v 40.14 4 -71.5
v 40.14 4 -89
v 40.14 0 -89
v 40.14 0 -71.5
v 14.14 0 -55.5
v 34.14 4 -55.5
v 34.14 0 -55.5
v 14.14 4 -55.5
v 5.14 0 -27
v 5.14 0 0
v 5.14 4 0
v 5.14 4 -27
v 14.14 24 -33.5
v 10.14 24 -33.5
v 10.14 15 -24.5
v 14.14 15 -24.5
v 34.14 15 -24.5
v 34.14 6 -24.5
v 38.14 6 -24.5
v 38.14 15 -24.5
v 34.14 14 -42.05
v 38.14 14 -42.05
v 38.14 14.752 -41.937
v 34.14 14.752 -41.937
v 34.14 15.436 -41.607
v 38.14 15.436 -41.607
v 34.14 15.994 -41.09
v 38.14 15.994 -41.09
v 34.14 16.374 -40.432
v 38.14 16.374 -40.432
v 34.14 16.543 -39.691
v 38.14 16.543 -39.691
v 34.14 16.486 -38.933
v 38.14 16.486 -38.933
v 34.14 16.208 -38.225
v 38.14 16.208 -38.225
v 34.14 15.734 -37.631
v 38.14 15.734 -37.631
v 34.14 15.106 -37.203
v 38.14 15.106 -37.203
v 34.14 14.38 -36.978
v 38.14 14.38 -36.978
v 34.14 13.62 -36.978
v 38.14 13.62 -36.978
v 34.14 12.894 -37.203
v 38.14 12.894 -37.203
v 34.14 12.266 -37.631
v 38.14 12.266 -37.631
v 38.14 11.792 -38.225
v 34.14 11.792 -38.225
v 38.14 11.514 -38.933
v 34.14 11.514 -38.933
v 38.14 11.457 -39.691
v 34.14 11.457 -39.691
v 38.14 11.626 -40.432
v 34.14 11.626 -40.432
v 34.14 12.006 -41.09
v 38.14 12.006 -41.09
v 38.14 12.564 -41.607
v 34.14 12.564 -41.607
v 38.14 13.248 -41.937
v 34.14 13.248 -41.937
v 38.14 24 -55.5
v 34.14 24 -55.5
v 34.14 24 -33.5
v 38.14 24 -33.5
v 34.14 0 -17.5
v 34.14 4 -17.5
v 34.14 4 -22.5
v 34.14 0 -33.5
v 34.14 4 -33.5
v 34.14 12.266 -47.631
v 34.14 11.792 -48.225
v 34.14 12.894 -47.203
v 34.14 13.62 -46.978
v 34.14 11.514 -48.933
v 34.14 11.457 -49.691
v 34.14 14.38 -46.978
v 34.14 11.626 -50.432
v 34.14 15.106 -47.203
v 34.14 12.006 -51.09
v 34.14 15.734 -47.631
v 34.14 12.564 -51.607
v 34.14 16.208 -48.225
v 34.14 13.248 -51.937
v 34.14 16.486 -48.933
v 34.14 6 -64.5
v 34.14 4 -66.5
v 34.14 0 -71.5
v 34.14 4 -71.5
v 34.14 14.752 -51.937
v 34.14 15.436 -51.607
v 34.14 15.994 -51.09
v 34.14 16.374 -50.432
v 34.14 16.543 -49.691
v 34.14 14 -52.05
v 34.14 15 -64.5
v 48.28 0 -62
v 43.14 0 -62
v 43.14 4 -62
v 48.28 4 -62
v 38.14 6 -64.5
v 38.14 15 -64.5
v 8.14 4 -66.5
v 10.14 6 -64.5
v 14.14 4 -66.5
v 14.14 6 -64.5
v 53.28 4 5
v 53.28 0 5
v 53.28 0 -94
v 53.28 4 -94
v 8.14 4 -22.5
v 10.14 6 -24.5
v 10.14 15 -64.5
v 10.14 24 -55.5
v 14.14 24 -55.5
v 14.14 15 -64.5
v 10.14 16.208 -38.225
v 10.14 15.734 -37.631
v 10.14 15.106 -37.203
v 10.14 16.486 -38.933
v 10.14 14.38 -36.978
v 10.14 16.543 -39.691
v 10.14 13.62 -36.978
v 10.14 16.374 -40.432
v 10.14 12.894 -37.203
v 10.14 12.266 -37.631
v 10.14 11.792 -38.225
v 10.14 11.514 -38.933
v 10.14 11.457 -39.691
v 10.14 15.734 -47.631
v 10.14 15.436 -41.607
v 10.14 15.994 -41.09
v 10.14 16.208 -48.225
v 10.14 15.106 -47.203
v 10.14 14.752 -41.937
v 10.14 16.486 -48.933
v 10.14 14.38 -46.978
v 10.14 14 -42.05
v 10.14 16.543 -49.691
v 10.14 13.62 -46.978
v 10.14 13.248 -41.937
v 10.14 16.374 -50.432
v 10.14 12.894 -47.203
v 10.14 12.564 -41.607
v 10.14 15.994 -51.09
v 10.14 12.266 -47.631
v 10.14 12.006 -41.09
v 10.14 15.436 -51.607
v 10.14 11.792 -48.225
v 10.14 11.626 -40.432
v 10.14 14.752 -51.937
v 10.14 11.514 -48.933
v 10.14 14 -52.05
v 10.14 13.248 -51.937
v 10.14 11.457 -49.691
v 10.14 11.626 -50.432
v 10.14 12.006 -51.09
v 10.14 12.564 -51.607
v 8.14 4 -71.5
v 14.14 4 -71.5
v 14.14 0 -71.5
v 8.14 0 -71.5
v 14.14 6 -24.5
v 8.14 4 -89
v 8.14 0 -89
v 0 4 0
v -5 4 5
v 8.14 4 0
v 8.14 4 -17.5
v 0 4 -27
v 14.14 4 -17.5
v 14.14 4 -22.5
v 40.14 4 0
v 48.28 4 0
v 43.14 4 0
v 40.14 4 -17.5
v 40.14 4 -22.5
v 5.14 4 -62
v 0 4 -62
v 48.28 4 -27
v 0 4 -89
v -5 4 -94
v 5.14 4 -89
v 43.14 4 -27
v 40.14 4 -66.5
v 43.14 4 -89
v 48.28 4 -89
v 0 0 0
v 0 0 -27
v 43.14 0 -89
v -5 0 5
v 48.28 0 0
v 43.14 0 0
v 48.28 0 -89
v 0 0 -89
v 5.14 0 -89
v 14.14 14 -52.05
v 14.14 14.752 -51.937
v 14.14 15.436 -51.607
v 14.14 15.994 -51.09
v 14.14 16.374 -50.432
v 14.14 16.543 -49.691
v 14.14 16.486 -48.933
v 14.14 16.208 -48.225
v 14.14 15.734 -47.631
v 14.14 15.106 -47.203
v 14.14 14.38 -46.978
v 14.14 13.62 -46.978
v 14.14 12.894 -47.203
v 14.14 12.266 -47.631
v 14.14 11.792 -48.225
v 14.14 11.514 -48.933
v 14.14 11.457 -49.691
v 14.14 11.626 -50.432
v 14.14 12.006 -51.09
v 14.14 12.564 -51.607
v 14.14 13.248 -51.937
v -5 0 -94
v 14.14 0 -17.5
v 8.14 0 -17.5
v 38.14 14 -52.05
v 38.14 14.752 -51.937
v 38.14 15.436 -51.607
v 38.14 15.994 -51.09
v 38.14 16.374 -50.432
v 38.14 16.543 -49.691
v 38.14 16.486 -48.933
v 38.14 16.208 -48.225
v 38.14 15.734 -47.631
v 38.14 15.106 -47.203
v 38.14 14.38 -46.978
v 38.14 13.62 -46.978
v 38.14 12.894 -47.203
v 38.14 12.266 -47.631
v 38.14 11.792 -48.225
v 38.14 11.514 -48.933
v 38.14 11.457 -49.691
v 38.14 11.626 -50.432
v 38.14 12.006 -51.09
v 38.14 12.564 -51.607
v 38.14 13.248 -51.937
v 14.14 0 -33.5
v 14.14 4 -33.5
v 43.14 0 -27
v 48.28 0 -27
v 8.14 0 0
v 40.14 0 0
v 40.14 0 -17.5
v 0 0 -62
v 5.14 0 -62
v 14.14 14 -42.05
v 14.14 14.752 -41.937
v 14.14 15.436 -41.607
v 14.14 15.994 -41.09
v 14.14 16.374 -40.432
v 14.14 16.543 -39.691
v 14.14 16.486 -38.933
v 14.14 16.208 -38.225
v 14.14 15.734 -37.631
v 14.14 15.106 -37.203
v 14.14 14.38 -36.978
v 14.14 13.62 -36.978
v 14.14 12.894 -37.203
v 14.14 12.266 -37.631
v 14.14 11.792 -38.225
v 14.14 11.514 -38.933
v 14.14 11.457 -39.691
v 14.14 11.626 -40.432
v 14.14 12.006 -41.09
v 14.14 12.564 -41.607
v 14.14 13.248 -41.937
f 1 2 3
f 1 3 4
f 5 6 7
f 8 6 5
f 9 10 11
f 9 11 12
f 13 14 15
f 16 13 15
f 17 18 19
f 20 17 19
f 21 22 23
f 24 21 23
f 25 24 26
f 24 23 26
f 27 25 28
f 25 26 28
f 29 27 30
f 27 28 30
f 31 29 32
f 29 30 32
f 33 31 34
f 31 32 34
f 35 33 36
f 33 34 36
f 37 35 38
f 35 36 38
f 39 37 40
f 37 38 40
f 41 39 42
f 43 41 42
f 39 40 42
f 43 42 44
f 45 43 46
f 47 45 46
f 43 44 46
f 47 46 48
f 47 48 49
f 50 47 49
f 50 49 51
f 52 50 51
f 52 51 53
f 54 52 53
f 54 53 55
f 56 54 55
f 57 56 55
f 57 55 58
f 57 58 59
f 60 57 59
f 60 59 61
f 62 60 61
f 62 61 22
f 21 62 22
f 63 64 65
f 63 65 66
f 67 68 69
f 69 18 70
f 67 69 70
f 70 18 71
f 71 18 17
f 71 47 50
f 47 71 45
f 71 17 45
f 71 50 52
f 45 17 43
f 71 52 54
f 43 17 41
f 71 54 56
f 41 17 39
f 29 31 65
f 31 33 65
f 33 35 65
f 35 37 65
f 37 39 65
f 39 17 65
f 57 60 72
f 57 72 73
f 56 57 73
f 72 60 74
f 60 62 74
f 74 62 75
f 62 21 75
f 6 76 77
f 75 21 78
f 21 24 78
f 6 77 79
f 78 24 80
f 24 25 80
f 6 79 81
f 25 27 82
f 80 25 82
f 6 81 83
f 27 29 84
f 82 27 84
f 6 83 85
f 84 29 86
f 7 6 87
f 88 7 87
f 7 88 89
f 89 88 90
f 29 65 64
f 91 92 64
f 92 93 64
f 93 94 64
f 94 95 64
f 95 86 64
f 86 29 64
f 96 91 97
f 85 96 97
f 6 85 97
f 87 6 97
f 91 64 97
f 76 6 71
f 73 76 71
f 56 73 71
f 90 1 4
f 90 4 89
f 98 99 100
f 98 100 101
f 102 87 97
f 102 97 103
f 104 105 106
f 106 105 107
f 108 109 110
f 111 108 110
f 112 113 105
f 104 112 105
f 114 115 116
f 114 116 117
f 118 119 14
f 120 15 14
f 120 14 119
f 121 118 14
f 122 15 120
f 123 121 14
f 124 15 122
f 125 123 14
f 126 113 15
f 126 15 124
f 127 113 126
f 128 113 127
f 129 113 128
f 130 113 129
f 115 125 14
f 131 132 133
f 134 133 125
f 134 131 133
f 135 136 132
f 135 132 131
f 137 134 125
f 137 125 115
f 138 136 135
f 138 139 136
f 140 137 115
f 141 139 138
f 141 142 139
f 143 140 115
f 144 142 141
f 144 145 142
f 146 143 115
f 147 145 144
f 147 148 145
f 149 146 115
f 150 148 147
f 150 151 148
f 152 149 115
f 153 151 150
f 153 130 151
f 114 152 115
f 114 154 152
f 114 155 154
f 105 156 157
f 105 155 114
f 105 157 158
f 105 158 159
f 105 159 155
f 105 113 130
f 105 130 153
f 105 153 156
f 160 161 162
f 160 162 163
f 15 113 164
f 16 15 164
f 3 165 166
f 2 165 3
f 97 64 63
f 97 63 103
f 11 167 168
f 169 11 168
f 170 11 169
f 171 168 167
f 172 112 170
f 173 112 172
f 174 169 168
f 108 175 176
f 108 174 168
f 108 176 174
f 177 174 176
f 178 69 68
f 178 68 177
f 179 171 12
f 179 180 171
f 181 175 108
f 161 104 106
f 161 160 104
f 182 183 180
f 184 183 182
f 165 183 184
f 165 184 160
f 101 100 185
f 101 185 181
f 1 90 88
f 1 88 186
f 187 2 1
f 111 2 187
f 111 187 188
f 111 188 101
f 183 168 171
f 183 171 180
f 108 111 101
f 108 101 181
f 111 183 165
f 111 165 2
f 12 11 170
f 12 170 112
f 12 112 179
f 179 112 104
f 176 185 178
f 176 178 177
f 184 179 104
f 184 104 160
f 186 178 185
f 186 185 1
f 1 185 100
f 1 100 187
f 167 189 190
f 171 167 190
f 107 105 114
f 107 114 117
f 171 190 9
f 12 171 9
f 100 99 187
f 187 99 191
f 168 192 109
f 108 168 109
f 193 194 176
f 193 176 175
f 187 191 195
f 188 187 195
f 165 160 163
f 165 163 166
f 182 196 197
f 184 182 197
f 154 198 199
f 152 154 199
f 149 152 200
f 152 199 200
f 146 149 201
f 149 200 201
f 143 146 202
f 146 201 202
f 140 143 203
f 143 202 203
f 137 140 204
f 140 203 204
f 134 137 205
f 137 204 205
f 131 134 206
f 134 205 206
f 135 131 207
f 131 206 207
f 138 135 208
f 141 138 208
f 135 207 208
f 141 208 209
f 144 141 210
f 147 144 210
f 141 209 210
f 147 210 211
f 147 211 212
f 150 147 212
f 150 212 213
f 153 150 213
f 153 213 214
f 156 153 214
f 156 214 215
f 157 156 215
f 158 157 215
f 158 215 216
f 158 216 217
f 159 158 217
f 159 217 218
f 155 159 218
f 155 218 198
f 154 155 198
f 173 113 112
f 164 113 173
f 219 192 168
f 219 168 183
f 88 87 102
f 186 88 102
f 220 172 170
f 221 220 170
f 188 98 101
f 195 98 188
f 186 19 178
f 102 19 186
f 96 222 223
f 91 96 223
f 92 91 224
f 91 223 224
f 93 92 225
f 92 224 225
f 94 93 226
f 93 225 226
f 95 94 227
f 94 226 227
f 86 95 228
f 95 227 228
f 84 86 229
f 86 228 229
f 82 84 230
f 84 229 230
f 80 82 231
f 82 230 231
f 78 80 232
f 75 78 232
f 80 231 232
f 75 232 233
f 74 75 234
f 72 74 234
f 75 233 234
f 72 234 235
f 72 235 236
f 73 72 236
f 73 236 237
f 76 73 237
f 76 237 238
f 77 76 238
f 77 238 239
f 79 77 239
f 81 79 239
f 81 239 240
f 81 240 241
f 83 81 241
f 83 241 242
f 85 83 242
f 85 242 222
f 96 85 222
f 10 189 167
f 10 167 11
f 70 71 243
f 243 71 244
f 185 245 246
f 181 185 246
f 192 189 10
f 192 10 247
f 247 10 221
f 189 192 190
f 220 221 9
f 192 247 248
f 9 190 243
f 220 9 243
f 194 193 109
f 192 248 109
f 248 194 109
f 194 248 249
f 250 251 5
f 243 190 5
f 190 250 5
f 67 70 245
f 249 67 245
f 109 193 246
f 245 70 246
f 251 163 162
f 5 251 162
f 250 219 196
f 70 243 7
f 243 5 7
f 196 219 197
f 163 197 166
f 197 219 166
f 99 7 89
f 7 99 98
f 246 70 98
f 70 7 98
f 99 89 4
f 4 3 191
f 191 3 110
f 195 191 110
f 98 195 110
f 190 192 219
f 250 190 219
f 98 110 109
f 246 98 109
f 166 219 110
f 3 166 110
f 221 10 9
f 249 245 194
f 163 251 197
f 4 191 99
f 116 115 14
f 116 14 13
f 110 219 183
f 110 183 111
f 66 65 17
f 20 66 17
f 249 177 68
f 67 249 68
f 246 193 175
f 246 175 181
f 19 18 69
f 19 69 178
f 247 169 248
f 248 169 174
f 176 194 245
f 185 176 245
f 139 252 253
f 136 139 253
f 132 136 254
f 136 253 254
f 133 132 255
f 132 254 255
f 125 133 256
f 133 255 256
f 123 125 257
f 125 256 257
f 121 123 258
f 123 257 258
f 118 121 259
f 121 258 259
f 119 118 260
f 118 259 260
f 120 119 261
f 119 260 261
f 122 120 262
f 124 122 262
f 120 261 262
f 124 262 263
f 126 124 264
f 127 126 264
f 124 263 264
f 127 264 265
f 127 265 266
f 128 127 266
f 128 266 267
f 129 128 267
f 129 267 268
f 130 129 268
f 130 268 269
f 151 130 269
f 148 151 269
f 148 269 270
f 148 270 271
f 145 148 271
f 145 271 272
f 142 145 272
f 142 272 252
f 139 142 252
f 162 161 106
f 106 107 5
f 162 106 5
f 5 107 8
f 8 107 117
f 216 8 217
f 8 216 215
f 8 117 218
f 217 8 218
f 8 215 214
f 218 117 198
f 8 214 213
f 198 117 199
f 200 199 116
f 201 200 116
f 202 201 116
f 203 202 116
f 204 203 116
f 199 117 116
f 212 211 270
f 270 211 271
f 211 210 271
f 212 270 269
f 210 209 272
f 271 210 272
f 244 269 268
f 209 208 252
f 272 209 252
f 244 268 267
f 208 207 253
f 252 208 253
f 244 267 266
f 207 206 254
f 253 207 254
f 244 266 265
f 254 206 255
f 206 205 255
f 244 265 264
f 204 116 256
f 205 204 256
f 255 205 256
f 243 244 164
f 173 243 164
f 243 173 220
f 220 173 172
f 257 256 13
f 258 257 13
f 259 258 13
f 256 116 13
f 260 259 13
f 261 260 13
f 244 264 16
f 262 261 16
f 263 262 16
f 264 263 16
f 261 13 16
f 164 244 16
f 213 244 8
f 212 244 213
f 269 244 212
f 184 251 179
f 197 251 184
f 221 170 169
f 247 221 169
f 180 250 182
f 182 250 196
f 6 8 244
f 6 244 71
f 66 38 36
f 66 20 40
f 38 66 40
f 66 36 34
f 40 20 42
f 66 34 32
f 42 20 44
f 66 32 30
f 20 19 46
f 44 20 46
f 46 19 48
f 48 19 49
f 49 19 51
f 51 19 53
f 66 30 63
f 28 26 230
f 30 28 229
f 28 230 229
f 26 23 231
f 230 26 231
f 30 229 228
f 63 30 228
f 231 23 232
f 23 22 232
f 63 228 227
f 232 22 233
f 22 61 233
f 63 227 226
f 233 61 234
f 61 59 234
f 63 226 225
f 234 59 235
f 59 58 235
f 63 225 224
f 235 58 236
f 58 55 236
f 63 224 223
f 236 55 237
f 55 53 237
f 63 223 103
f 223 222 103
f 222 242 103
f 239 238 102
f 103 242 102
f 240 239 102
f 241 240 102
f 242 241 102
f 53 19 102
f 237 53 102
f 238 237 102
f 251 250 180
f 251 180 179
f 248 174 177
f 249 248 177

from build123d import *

# Parameters (mm, degrees)
SKETCH1_W           = 58.28
SKETCH1_H           = 99
SKETCH1_W_2         = 5.14
SKETCH1_H_2         = 27
BOSS_EXTRUDE1_DEPTH = 4
SKETCH2_W           = 4
SKETCH2_H           = 40
BOSS_EXTRUDE2_DEPTH = 20
CUT_EXTRUDE1_REACH  = 108.175
SKETCH3_R           = 2.55
CHAMFER1_SIZE       = 2
CUT_EXTRUDE2_REACH  = 108.175
CUT_EXTRUDE3_DEPTH  = 4


with BuildPart() as part:
    # Sketch1 → Boss-Extrude1 (new body)
    with BuildSketch(Plane(origin=(0, 0, 0), x_dir=(1, 0, 0), z_dir=(0, 1, 0))):
        with Locations((24.14, 44.5)):
            Rectangle(SKETCH1_W, SKETCH1_H)
        with Locations((2.57, 75.5)):
            Rectangle(SKETCH1_W_2, SKETCH1_H_2, mode=Mode.SUBTRACT)
        with Locations((45.71, 75.5)):
            Rectangle(SKETCH1_W_2, SKETCH1_H_2, mode=Mode.SUBTRACT)
        with Locations((2.57, 13.5)):
            Rectangle(SKETCH1_W_2, SKETCH1_H_2, mode=Mode.SUBTRACT)
        with Locations((45.71, 13.5)):
            Rectangle(SKETCH1_W_2, SKETCH1_H_2, mode=Mode.SUBTRACT)
    extrude(amount=BOSS_EXTRUDE1_DEPTH)

    # Sketch2 → Boss-Extrude2 (add)
    with BuildSketch(Plane(origin=(0, 4, 0), x_dir=(1, 0, 0), z_dir=(0, 1, 0))):
        with Locations((12.14, 44.5)):
            Rectangle(SKETCH2_W, SKETCH2_H)
        with Locations((36.14, 44.5)):
            Rectangle(SKETCH2_W, SKETCH2_H)
    extrude(amount=BOSS_EXTRUDE2_DEPTH)

    # Cut-Extrude1: up to this face of the body (flat: up to its plane)
    cut_extrude1_end = Plane(part.part.faces().sort_by_distance((10.14, 14, -44.5))[0])
    # Sketch3 → Cut-Extrude1 (cut, up to the picked face)
    with BuildSketch(Plane(origin=(38.14, 0, 0), x_dir=(0, 0, -1), z_dir=(1, 0, 0)), mode=Mode.PRIVATE) as cut_extrude1_sk1:
        with Locations((39.5, 14)):
            Circle(SKETCH3_R)
    cut_extrude1_tool1 = split(extrude(cut_extrude1_sk1.sketch, amount=-CUT_EXTRUDE1_REACH, mode=Mode.PRIVATE), bisect_by=cut_extrude1_end, keep=Keep.BOTH, mode=Mode.PRIVATE)
    # Sketch3 → Cut-Extrude1 (cut, up to the picked face)
    with BuildSketch(Plane(origin=(38.14, 0, 0), x_dir=(0, 0, -1), z_dir=(1, 0, 0)), mode=Mode.PRIVATE) as cut_extrude1_sk2:
        with Locations((49.5, 14)):
            Circle(SKETCH3_R)
    cut_extrude1_tool2 = split(extrude(cut_extrude1_sk2.sketch, amount=-CUT_EXTRUDE1_REACH, mode=Mode.PRIVATE), bisect_by=cut_extrude1_end, keep=Keep.BOTH, mode=Mode.PRIVATE)
    add(cut_extrude1_tool1.solids().sort_by(Axis((38.14, 14, -39.5), (-1, 0, 0)))[0], mode=Mode.SUBTRACT)
    add(cut_extrude1_tool2.solids().sort_by(Axis((38.14, 14, -49.5), (-1, 0, 0)))[0], mode=Mode.SUBTRACT)

    # Chamfer1
    chamfer1_edges = [part.edges().sort_by_distance(p)[0] for p in [
        (12.14, 4, -64.5),
        (10.14, 4, -44.5),
        (12.14, 4, -24.5),
        (36.14, 4, -24.5),
        (38.14, 4, -44.5),
        (36.14, 4, -64.5),
    ]]
    chamfer(chamfer1_edges, length=CHAMFER1_SIZE)

    # Cut-Extrude2: up to this face of the body (flat: up to its plane)
    cut_extrude2_end = Plane(part.part.faces().sort_by_distance((38.14, 15.060158725, -44.5))[0])
    # Sketch4 → Cut-Extrude2 (cut, up to the picked face)
    with BuildSketch(Plane.ZY.offset(-10.14), mode=Mode.PRIVATE) as cut_extrude2_sk1:
        Polygon((-55.5, 24), (-64.5, 15), (-64.5, 24), align=None)
    cut_extrude2_tool1 = split(extrude(cut_extrude2_sk1.sketch, amount=-CUT_EXTRUDE2_REACH, mode=Mode.PRIVATE), bisect_by=cut_extrude2_end, keep=Keep.BOTH, mode=Mode.PRIVATE)
    # Sketch4 → Cut-Extrude2 (cut, up to the picked face)
    with BuildSketch(Plane.ZY.offset(-10.14), mode=Mode.PRIVATE) as cut_extrude2_sk2:
        Polygon((-33.5, 24), (-24.5, 15), (-24.5, 24), align=None)
    cut_extrude2_tool2 = split(extrude(cut_extrude2_sk2.sketch, amount=-CUT_EXTRUDE2_REACH, mode=Mode.PRIVATE), bisect_by=cut_extrude2_end, keep=Keep.BOTH, mode=Mode.PRIVATE)
    add(cut_extrude2_tool1.solids().sort_by(Axis((10.14, 21, -61.5), (1, 0, 0)))[0], mode=Mode.SUBTRACT)
    add(cut_extrude2_tool2.solids().sort_by(Axis((10.14, 21, -27.5), (1, 0, 0)))[0], mode=Mode.SUBTRACT)

    # Sketch5 → Cut-Extrude3 (cut)
    with BuildSketch(Plane(origin=(0, 4, 0), x_dir=(1, 0, 0), z_dir=(0, 1, 0))):
        Polygon((8.14, 89), (40.14, 89), (40.14, 71.5), (34.14, 71.5), (34.14, 55.5), (14.14, 55.5), (14.14, 71.5), (8.14, 71.5), align=None)
        Polygon((8.14, 0), (40.14, 0), (40.14, 17.5), (34.14, 17.5), (34.14, 33.5), (14.14, 33.5), (14.14, 17.5), (8.14, 17.5), align=None)
    extrude(amount=-CUT_EXTRUDE3_DEPTH, mode=Mode.SUBTRACT)


solid = part.part
